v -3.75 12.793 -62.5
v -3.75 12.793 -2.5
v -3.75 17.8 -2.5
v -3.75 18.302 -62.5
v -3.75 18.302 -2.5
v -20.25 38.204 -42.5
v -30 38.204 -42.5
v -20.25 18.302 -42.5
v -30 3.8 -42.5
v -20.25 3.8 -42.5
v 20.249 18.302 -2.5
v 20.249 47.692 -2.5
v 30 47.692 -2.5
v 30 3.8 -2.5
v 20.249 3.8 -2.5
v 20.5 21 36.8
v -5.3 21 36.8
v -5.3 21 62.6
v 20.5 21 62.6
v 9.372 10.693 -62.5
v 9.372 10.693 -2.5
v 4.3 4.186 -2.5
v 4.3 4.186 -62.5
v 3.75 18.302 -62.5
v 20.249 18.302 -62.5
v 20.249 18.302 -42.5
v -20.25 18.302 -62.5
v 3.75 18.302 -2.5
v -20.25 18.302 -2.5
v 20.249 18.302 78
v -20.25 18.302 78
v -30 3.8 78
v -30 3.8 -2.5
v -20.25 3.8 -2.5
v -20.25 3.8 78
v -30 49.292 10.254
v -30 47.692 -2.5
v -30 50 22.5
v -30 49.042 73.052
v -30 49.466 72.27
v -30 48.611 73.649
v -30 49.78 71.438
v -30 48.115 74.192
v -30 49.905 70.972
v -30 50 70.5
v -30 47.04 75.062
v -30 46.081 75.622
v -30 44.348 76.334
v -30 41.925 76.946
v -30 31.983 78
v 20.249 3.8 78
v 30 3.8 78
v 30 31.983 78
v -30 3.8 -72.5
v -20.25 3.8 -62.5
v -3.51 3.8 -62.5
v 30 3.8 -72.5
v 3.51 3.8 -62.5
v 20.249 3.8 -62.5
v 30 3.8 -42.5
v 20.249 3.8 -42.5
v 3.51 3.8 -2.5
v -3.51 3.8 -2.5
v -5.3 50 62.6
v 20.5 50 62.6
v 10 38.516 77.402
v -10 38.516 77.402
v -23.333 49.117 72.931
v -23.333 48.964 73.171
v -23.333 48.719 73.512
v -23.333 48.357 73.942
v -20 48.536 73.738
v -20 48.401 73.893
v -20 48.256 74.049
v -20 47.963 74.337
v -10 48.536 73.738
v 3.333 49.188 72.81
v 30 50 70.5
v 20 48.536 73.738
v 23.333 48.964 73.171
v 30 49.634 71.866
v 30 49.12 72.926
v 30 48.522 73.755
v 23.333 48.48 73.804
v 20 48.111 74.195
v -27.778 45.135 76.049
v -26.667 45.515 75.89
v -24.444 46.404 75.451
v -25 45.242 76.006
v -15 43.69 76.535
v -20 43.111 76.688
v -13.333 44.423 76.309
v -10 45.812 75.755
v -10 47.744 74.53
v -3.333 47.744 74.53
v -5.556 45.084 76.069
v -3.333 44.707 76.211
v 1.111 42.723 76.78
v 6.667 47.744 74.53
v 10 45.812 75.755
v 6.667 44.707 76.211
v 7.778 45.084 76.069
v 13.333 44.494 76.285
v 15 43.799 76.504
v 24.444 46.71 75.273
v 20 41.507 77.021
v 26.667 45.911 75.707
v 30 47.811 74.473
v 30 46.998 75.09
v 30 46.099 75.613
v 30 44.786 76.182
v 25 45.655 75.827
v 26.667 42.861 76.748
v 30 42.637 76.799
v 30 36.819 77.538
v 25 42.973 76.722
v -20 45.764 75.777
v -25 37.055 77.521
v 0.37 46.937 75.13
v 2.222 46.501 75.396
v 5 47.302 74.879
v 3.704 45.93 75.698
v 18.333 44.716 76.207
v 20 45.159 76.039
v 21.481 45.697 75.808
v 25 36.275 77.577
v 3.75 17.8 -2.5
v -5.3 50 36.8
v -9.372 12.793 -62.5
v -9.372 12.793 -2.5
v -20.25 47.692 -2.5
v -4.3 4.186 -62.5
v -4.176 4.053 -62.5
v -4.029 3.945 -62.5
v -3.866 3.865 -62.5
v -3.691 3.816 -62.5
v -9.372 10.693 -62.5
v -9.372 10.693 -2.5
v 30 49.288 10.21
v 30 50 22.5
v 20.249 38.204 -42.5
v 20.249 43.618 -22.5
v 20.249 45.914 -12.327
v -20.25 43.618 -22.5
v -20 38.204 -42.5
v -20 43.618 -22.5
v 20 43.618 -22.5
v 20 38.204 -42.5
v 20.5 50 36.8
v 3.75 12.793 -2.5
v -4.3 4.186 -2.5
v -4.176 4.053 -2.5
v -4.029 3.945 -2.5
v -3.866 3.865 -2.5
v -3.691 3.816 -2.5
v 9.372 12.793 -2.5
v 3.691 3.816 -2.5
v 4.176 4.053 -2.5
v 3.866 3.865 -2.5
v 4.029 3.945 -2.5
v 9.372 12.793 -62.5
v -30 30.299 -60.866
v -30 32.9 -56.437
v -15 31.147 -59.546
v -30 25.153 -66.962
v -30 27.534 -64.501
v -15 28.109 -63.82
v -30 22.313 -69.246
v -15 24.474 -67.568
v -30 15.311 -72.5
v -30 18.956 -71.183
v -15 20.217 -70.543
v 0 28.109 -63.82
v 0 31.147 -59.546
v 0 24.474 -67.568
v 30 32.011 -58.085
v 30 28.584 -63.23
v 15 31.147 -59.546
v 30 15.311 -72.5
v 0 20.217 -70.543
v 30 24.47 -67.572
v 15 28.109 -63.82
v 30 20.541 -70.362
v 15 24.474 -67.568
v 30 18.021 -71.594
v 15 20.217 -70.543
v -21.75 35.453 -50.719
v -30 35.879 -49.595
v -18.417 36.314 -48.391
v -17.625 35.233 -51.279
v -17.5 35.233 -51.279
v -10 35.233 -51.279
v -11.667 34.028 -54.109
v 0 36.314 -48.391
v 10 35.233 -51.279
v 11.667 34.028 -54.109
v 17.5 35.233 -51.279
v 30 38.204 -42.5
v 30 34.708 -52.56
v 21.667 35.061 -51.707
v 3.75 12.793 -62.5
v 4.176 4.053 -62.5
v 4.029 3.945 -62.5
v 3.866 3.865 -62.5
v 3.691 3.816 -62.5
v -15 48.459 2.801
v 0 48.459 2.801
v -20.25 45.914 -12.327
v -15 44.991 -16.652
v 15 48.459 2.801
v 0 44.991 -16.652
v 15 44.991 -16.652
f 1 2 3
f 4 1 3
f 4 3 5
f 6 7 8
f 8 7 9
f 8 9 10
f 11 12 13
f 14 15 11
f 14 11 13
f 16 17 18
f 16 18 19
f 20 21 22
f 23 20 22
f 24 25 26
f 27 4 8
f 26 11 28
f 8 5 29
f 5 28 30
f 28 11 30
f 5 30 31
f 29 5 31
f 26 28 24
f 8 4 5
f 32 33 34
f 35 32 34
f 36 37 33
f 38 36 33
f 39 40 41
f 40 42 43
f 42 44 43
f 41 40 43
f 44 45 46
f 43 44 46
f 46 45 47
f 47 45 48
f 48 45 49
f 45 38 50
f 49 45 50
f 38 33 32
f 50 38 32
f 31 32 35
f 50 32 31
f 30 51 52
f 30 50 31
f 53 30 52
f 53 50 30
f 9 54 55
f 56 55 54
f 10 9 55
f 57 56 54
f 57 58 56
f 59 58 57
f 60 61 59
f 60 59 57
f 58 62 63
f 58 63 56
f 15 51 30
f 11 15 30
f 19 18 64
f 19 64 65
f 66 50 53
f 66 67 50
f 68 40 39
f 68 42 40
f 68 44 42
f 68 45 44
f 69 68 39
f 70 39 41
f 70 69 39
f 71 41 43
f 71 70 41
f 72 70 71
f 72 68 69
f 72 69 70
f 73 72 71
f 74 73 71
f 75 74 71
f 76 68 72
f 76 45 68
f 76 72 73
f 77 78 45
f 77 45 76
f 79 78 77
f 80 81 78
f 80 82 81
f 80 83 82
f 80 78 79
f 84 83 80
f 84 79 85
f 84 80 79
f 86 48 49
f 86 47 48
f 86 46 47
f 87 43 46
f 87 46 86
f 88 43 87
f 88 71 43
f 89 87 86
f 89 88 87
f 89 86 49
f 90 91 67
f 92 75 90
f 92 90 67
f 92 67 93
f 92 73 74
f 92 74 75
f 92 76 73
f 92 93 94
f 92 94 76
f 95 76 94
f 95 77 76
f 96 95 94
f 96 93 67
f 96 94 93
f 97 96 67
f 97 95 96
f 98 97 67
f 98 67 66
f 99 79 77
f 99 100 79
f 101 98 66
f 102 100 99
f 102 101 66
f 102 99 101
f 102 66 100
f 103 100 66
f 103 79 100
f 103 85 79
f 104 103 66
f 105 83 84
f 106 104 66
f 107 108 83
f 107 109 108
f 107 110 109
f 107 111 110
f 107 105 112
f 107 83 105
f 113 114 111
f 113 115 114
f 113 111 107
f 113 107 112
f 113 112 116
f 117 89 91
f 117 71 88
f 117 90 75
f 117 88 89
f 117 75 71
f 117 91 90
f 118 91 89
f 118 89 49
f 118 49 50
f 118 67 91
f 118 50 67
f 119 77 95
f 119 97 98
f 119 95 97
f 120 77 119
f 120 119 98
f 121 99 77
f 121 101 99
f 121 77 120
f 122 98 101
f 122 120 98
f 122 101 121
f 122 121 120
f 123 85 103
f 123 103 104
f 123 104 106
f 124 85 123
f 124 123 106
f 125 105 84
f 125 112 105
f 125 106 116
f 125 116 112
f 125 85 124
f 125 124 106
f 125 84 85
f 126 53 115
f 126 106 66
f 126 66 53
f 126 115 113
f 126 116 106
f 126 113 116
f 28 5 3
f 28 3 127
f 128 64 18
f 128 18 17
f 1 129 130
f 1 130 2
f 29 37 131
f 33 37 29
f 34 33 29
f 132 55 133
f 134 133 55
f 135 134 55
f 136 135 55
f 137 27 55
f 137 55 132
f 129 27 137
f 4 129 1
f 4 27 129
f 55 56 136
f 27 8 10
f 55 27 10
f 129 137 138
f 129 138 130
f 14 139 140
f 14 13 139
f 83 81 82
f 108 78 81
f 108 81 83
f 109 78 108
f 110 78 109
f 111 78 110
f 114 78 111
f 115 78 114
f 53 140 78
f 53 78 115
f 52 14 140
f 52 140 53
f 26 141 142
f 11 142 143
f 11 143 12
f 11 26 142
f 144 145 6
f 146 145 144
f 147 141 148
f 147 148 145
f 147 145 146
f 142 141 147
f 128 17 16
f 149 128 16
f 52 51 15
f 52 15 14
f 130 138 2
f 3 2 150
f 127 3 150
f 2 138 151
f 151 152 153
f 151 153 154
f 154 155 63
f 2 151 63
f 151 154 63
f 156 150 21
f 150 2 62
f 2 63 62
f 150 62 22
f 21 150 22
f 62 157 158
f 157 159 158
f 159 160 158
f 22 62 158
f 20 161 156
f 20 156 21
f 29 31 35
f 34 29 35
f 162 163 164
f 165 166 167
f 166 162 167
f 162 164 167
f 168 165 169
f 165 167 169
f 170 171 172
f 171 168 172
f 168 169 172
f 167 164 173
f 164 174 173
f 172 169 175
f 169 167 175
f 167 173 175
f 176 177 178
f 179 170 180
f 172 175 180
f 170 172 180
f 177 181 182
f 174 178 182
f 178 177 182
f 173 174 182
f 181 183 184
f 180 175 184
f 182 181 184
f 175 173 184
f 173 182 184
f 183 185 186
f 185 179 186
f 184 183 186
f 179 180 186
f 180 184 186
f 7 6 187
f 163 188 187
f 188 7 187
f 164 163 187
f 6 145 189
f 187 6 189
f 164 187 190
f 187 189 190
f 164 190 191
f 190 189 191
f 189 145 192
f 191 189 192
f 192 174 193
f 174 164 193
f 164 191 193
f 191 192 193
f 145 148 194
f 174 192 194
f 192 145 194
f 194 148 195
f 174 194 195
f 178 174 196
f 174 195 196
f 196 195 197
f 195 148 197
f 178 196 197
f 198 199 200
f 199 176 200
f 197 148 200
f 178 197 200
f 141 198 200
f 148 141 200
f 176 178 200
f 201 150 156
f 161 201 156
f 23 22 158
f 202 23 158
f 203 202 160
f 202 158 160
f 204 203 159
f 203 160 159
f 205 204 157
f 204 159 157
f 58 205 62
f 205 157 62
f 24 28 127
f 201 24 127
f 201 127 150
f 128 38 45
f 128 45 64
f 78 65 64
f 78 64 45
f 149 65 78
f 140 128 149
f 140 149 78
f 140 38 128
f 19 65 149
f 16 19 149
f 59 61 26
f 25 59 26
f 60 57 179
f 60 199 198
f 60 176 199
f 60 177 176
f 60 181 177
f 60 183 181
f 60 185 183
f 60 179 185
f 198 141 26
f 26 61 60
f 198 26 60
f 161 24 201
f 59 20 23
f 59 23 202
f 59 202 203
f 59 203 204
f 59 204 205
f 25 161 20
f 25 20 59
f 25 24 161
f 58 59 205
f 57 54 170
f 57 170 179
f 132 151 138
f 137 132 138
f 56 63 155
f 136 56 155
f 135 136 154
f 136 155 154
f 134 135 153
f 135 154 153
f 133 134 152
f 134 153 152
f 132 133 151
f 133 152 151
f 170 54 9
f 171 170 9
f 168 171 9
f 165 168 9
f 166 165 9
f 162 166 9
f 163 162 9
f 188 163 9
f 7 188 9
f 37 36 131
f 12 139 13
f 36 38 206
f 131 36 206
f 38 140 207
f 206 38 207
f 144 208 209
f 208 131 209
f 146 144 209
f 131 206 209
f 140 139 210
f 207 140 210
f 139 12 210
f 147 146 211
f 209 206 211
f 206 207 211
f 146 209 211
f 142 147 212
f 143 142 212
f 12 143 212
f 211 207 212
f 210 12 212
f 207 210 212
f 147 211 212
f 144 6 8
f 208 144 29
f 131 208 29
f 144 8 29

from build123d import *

# Parameters (mm, degrees)
SKETCH_1_W                = 100
SKETCH_1_H                = 185
EXTRUDE_1_DEPTH           = 100
SKETCH_2_W                = 100
SKETCH_2_H                = 3.8
CUT_EXTRUDE_1_DEPTH       = 155
CUT_EXTRUDE_2_DEPTH       = 155
SKETCH_4_W                = 25.5
SKETCH_4_H                = 25.5
CUT_EXTRUDE_3_DEPTH       = 79
SKETCH_6_W                = 89.706259743
SKETCH_6_H                = 10
SKETCH_6_W_2              = 10.293740257
CUT_EXTRUDE_4_DEPTH       = 146.107718609
CUT_EXTRUDE_5_DEPTH       = 169.985946161
CUT_EXTRUDE_5_DEPTH_BACK  = 169.985946161
SKETCH_7_W                = 20
SKETCH_7_H                = 3.8
EXTRUDE_4_DEPTH           = 160
SKETCH_10_W               = 16
SKETCH_10_H               = 1.8
CUT_EXTRUDE_6_DEPTH       = 155
SKETCH_13_W               = 20
SKETCH_13_H               = 175
CUT_EXTRUDE_7_DEPTH       = 143.515578096
SKETCH_14_W               = 175
SKETCH_14_H               = 50
CUT_EXTRUDE_8_DEPTH       = 149.849756466
SKETCH_15_W               = 60
SKETCH_15_H               = 10
CUT_EXTRUDE_9_DEPTH       = 108.660066877
SKETCH_16_W               = 60
SKETCH_16_H               = 14.5
CUT_EXTRUDE_10_DEPTH      = 108.660066877
CUT_EXTRUDE_11_DEPTH      = 111.381157812
CUT_EXTRUDE_21_DEPTH      = 162.400898529
CUT_EXTRUDE_21_DEPTH_BACK = 140.5
CUT_EXTRUDE_26_DEPTH      = 111.381157983
SKETCH_34_W               = 10
SKETCH_34_H               = 20
CUT_EXTRUDE_31_DEPTH      = 96.490523251
SKETCH_35_W               = 18.74373947
SKETCH_35_H               = 80.5
CUT_EXTRUDE_32_DEPTH      = 14
CUT_EXTRUDE_35_DEPTH      = 60
CUT_EXTRUDE_36_DEPTH      = 140.5
SKETCH_43_W               = 0.25
SKETCH_43_H               = 0.002112168
CUT_EXTRUDE_37_DEPTH      = 140.5
SKETCH_44_W               = 7.5
SKETCH_44_H               = 0.502112168
CUT_EXTRUDE_38_DEPTH      = 80.4999
SKETCH_45_W               = 9.75
SKETCH_45_H               = 20
SKETCH_45_W_2             = 9.75146362
CUT_EXTRUDE_39_DEPTH      = 96.490523251
SKETCH_46_W               = 0.24853638
SKETCH_46_H               = 20
SKETCH_46_W_2             = 0.25
EXTRUDE_5_DEPTH           = 31.697888
CUT_EXTRUDE_40_DEPTH      = 106.399537724
CUT_EXTRUDE_40_DEPTH_BACK = 106.399537724
SKETCH_54_W               = 25.5
SKETCH_54_H               = 0.5
CUT_EXTRUDE_41_DEPTH      = 29
SKETCH_55_W               = 26
SKETCH_55_H               = 26
EXTRUDE_6_DEPTH           = 29
SKETCH_56_W               = 25.8
SKETCH_56_H               = 25.8
CUT_EXTRUDE_42_DEPTH      = 29


with BuildPart() as part:
    # 草图1 → 凸台-拉伸1 (new body)
    with BuildSketch(Plane(origin=(0, 0, 0), x_dir=(1, 0, 0), z_dir=(0, 1, 0))):
        Rectangle(SKETCH_1_W, SKETCH_1_H)
    extrude(amount=EXTRUDE_1_DEPTH)

    # 草图2 → 切除-拉伸1 (cut)
    with BuildSketch(Plane.XY.offset(92.5)):
        with Locations((0, 1.9)):
            Rectangle(SKETCH_2_W, SKETCH_2_H)
    extrude(amount=-CUT_EXTRUDE_1_DEPTH, mode=Mode.SUBTRACT)

    # 草图3 → 切除-拉伸2 (cut)
    with BuildSketch(Plane.XY.offset(92.5)):
        with BuildLine():
            Line((-20, 3.8), (-3.51, 3.8))
            ThreePointArc((-3.51, 3.8), (-3.949598778, 3.901619975), (-4.3, 4.185860522))
            Line((-4.3, 4.185860522), (-9.371869735, 10.69267521))
            ThreePointArc((-9.371869735, 10.69267521), (-9.267749528, 11.143089764), (-8.9765156, 11.502112168))
            Line((-8.9765156, 11.502112168), (-4.5, 11.502112168))
            ThreePointArc((-4.5, 11.502112168), (-4.146446609, 11.648558777), (-4, 12.002112168))
            Line((-4, 12.002112168), (-4, 16.002112168))
            Line((-4, 16.002112168), (-20, 16.002112168))
            Line((-20, 16.002112168), (-20, 3.8))
        make_face()
        with BuildLine():
            ThreePointArc((4.3, 4.185860522), (3.949598778, 3.901619975), (3.51, 3.8))
            Line((3.51, 3.8), (20, 3.8))
            Line((20, 3.8), (20, 16.002112168))
            Line((20, 16.002112168), (4, 16.002112168))
            Line((4, 16.002112168), (4, 12.002112168))
            ThreePointArc((4, 12.002112168), (4.146446609, 11.648558777), (4.5, 11.502112168))
            Line((4.5, 11.502112168), (8.9765156, 11.502112168))
            ThreePointArc((8.9765156, 11.502112168), (9.426930154, 11.220838522), (9.371869735, 10.69267521))
            Line((9.371869735, 10.69267521), (4.3, 4.185860522))
        make_face()
    extrude(amount=-CUT_EXTRUDE_2_DEPTH, mode=Mode.SUBTRACT)

    # 草图4 → 切除-拉伸3 (cut)
    with BuildSketch(Plane(origin=(0, 100, 0), x_dir=(1, 0, 0), z_dir=(0, 1, 0))):
        with Locations((7.75, -50.25)):
            Rectangle(SKETCH_4_W, SKETCH_4_H)
    extrude(amount=-CUT_EXTRUDE_3_DEPTH, mode=Mode.SUBTRACT)

    # 草图6 → 切除-拉伸4 (cut, through all)
    with BuildSketch(Plane(origin=(0, 100, 0), x_dir=(1, 0, 0), z_dir=(0, 1, 0))):
        with Locations((5.146870128, 87.5)):
            Rectangle(SKETCH_6_W, SKETCH_6_H)
        with Locations((-44.853129872, 87.5)):
            Rectangle(SKETCH_6_W_2, SKETCH_6_H)
    extrude(amount=-CUT_EXTRUDE_4_DEPTH, mode=Mode.SUBTRACT)

    # 草图7 → 切除-拉伸5 (cut, two sides: drawn at the far end of the back side and taken through both)
    with BuildSketch(Plane.ZY.offset(50).offset(-CUT_EXTRUDE_5_DEPTH_BACK)):
        with Locations((-72.5, 1.9)):
            Rectangle(SKETCH_7_W, SKETCH_7_H)
    extrude(amount=CUT_EXTRUDE_5_DEPTH + CUT_EXTRUDE_5_DEPTH_BACK, mode=Mode.SUBTRACT)

    # 草图9 → 凸台-拉伸4 (add)
    with BuildSketch(Plane.XY.offset(92.5)):
        Polygon((-9.371869735, 10.69267521), (-9.371869735, 13.29267521), (-4, 13.29267521), (4, 13.29267521), (9.371869735, 13.29267521), (9.371869735, 10.69267521), align=None)
    extrude(amount=-EXTRUDE_4_DEPTH)

    # 草图10 → 切除-拉伸6 (cut)
    with BuildSketch(Plane.XY.offset(92.5)):
        with Locations((-12, 16.902112168)):
            Rectangle(SKETCH_10_W, SKETCH_10_H)
        Polygon((4, 16.002112168), (4, 17.802112168), (19.99853638, 17.802112168), (20, 16.002112168), align=None)
    extrude(amount=-CUT_EXTRUDE_6_DEPTH, mode=Mode.SUBTRACT)

    # 草图13 → 切除-拉伸7 (cut, through all)
    with BuildSketch(Plane.XZ.offset(-3.8)):
        with Locations((-40, 5)):
            Rectangle(SKETCH_13_W, SKETCH_13_H)
        with Locations((40, 5)):
            Rectangle(SKETCH_13_W, SKETCH_13_H)
    extrude(amount=-CUT_EXTRUDE_7_DEPTH, mode=Mode.SUBTRACT)

    # 草图14 → 切除-拉伸8 (cut, through all)
    with BuildSketch(Plane(origin=(30, 0, 0), x_dir=(0, 0, -1), z_dir=(1, 0, 0))):
        with Locations((-5, 75)):
            Rectangle(SKETCH_14_W, SKETCH_14_H)
    extrude(amount=-CUT_EXTRUDE_8_DEPTH, mode=Mode.SUBTRACT)

    # 草图15 → 切除-拉伸9 (cut, through all)
    with BuildSketch(Plane.XZ.offset(-3.8)):
        with Locations((0, -77.5)):
            Rectangle(SKETCH_15_W, SKETCH_15_H)
    extrude(amount=-CUT_EXTRUDE_9_DEPTH, mode=Mode.SUBTRACT)

    # 草图16 → 切除-拉伸10 (cut, through all)
    with BuildSketch(Plane(origin=(0, 50, 0), x_dir=(1, 0, 0), z_dir=(0, 1, 0))):
        with Locations((0, -85.25)):
            Rectangle(SKETCH_16_W, SKETCH_16_H)
    extrude(amount=-CUT_EXTRUDE_10_DEPTH, mode=Mode.SUBTRACT)

    # 草图17 → 切除-拉伸11 (cut, through all)
    with BuildSketch(Plane(origin=(30, 0, 0), x_dir=(0, 0, -1), z_dir=(1, 0, 0))):
        with BuildLine():
            Line((72.5, 50), (-22.5, 50))
            add(Edge.make_bspline(
                [(-22.5, 50), (-9.330669895, 49.706144403), (11.085821801, 46.827148239), (38.239751221, 39.498978447), (59.688603115, 33.272875951), (70.679662454, 22.295526596), (72.5, 15.311284203)],
                knots=[0, 0, 0, 0, 0.374533404, 0.581855131, 0.802431491, 1, 1, 1, 1], degree=3))
            Line((72.5, 15.311284203), (72.5, 50))
        make_face()
    extrude(amount=-CUT_EXTRUDE_11_DEPTH, mode=Mode.SUBTRACT)

    # 草图24 → 切除-拉伸21 (cut, two sides: drawn at the far end of the back side and taken through both)
    with BuildSketch(Plane.XY.offset(78).offset(-CUT_EXTRUDE_21_DEPTH_BACK)):
        with BuildLine():
            Line((9.371869735, 11.309008937), (9.371869735, 10.69267521))
            ThreePointArc((9.371869735, 10.69267521), (9.477785695, 11.000842073), (9.371869735, 11.309008937))
        make_face()
    extrude(amount=CUT_EXTRUDE_21_DEPTH + CUT_EXTRUDE_21_DEPTH_BACK, mode=Mode.SUBTRACT)

    # 草图28 → 切除-拉伸26 (cut, through all)
    with BuildSketch(Plane(origin=(30, 0, 0), x_dir=(0, 0, -1), z_dir=(1, 0, 0))):
        with BuildLine():
            Line((-70.5, 50), (-78, 50))
            Line((-78, 50), (-78, 31.982866201))
            add(Edge.make_bspline(
                [(-70.5, 50), (-78.410932033, 48.656434308), (-77.0737544, 36.843285786), (-78, 31.982866201)],
                knots=[0, 0, 0, 0, 1, 1, 1, 1], degree=3))
        make_face()
    extrude(amount=-CUT_EXTRUDE_26_DEPTH, mode=Mode.SUBTRACT)

    # 草图34 → 切除-拉伸31 (cut, through all)
    with BuildSketch(Plane.XZ.offset(-3.8)):
        with Locations((-25, -32.5)):
            Rectangle(SKETCH_34_W, SKETCH_34_H)
        with Locations((25, -32.5)):
            Rectangle(SKETCH_34_W, SKETCH_34_H)
    extrude(amount=-CUT_EXTRUDE_31_DEPTH, mode=Mode.SUBTRACT)

    # 草图35 → 切除-拉伸32 (cut)
    with BuildSketch(Plane.XZ.offset(-3.8)):
        with Locations((0, 37.75)):
            Rectangle(SKETCH_35_W, SKETCH_35_H)
    extrude(amount=-CUT_EXTRUDE_32_DEPTH, mode=Mode.SUBTRACT)

    # 草图40 → 切除-拉伸35 (cut)
    with BuildSketch(Plane.XY.offset(-2.5)):
        Polygon((4, 13.29267521), (4, 17.8), (3.75, 17.8), (3.75, 12.79267521), (9.371869735, 12.79267521), (9.371869735, 13.29267521), align=None)
        Polygon((-3.75, 17.8), (-4, 17.8), (-4, 13.29267521), (-9.371869735, 13.29267521), (-9.371869735, 12.79267521), (-3.75, 12.79267521), align=None)
    extrude(amount=-CUT_EXTRUDE_35_DEPTH, mode=Mode.SUBTRACT)

    # 草图41 → 切除-拉伸36 (cut)
    with BuildSketch(Plane.XY.offset(78)):
        Polygon((-3.75, 18.302112168), (-20.25, 18.302112168), (-20.25, 3.8), (-20, 3.8), (-20, 17.802112168), (-3.75, 17.802112168), align=None)
        Polygon((3.75, 18.302112168), (3.75, 17.802112168), (19.99853638, 17.802112168), (19.99853638, 3.8), (20.24853638, 3.8), (20.24853638, 18.302112168), align=None)
    extrude(amount=-CUT_EXTRUDE_36_DEPTH, mode=Mode.SUBTRACT)

    # 草图43 → 切除-拉伸37 (cut)
    with BuildSketch(Plane.XY.offset(78)):
        with Locations((-3.875, 17.801056084)):
            Rectangle(SKETCH_43_W, SKETCH_43_H)
        with Locations((3.875, 17.801056084)):
            Rectangle(SKETCH_43_W, SKETCH_43_H)
    extrude(amount=-CUT_EXTRUDE_37_DEPTH, mode=Mode.SUBTRACT)

    # 草图44 → 切除-拉伸38 (cut)
    with BuildSketch(Plane.XY.offset(78)):
        with Locations((0, 18.051056084)):
            Rectangle(SKETCH_44_W, SKETCH_44_H)
    extrude(amount=-CUT_EXTRUDE_38_DEPTH, mode=Mode.SUBTRACT)

    # 草图45 → 切除-拉伸39 (cut, through all)
    with BuildSketch(Plane.XZ.offset(-3.8)):
        with Locations((-25.125, -12.5)):
            Rectangle(SKETCH_45_W, SKETCH_45_H)
        with Locations((25.12426819, -12.5)):
            Rectangle(SKETCH_45_W_2, SKETCH_45_H)
    extrude(amount=-CUT_EXTRUDE_39_DEPTH, mode=Mode.SUBTRACT)

    # 草图46 → 凸台-拉伸5 (add, through all)
    with BuildSketch(Plane.XZ.offset(-18.302112168)):
        with Locations((20.12426819, -32.5)):
            Rectangle(SKETCH_46_W, SKETCH_46_H)
        with Locations((-20.125, -32.5)):
            Rectangle(SKETCH_46_W_2, SKETCH_46_H)
    extrude(amount=-EXTRUDE_5_DEPTH)

    # 草图47 → 切除-拉伸40 (cut, two sides: drawn at the far end of the back side and taken through both)
    with BuildSketch(Plane.ZY.offset(20.25).offset(-CUT_EXTRUDE_40_DEPTH_BACK)):
        Polygon((-42.5, 38.203961841), (-22.5, 43.618048783), (-22.5, 50), (-42.5, 50), align=None)
    extrude(amount=CUT_EXTRUDE_40_DEPTH + CUT_EXTRUDE_40_DEPTH_BACK, mode=Mode.SUBTRACT)

    # 草图54 → 切除-拉伸41 (cut)
    with BuildSketch(Plane(origin=(0, 50, 0), x_dir=(1, 0, 0), z_dir=(0, 1, 0))):
        with Locations((7.75, -37.25)):
            Rectangle(SKETCH_54_W, SKETCH_54_H)
        Polygon((-5, -63), (-5, -37.5), (-5, -37), (-5.5, -37), (-5.5, -63), align=None)
    extrude(amount=-CUT_EXTRUDE_41_DEPTH, mode=Mode.SUBTRACT)

    # 草图55 → 凸台-拉伸6 (add)
    with BuildSketch(Plane(origin=(0, 50, 0), x_dir=(1, 0, 0), z_dir=(0, 1, 0))):
        with Locations((7.5, -50)):
            Rectangle(SKETCH_55_W, SKETCH_55_H)
    extrude(amount=-EXTRUDE_6_DEPTH)

    # 草图56 → 切除-拉伸42 (cut)
    with BuildSketch(Plane(origin=(0, 50, 0), x_dir=(1, 0, 0), z_dir=(0, 1, 0))):
        with Locations((7.6, -49.7)):
            Rectangle(SKETCH_56_W, SKETCH_56_H)
    extrude(amount=-CUT_EXTRUDE_42_DEPTH, mode=Mode.SUBTRACT)


solid = part.part
